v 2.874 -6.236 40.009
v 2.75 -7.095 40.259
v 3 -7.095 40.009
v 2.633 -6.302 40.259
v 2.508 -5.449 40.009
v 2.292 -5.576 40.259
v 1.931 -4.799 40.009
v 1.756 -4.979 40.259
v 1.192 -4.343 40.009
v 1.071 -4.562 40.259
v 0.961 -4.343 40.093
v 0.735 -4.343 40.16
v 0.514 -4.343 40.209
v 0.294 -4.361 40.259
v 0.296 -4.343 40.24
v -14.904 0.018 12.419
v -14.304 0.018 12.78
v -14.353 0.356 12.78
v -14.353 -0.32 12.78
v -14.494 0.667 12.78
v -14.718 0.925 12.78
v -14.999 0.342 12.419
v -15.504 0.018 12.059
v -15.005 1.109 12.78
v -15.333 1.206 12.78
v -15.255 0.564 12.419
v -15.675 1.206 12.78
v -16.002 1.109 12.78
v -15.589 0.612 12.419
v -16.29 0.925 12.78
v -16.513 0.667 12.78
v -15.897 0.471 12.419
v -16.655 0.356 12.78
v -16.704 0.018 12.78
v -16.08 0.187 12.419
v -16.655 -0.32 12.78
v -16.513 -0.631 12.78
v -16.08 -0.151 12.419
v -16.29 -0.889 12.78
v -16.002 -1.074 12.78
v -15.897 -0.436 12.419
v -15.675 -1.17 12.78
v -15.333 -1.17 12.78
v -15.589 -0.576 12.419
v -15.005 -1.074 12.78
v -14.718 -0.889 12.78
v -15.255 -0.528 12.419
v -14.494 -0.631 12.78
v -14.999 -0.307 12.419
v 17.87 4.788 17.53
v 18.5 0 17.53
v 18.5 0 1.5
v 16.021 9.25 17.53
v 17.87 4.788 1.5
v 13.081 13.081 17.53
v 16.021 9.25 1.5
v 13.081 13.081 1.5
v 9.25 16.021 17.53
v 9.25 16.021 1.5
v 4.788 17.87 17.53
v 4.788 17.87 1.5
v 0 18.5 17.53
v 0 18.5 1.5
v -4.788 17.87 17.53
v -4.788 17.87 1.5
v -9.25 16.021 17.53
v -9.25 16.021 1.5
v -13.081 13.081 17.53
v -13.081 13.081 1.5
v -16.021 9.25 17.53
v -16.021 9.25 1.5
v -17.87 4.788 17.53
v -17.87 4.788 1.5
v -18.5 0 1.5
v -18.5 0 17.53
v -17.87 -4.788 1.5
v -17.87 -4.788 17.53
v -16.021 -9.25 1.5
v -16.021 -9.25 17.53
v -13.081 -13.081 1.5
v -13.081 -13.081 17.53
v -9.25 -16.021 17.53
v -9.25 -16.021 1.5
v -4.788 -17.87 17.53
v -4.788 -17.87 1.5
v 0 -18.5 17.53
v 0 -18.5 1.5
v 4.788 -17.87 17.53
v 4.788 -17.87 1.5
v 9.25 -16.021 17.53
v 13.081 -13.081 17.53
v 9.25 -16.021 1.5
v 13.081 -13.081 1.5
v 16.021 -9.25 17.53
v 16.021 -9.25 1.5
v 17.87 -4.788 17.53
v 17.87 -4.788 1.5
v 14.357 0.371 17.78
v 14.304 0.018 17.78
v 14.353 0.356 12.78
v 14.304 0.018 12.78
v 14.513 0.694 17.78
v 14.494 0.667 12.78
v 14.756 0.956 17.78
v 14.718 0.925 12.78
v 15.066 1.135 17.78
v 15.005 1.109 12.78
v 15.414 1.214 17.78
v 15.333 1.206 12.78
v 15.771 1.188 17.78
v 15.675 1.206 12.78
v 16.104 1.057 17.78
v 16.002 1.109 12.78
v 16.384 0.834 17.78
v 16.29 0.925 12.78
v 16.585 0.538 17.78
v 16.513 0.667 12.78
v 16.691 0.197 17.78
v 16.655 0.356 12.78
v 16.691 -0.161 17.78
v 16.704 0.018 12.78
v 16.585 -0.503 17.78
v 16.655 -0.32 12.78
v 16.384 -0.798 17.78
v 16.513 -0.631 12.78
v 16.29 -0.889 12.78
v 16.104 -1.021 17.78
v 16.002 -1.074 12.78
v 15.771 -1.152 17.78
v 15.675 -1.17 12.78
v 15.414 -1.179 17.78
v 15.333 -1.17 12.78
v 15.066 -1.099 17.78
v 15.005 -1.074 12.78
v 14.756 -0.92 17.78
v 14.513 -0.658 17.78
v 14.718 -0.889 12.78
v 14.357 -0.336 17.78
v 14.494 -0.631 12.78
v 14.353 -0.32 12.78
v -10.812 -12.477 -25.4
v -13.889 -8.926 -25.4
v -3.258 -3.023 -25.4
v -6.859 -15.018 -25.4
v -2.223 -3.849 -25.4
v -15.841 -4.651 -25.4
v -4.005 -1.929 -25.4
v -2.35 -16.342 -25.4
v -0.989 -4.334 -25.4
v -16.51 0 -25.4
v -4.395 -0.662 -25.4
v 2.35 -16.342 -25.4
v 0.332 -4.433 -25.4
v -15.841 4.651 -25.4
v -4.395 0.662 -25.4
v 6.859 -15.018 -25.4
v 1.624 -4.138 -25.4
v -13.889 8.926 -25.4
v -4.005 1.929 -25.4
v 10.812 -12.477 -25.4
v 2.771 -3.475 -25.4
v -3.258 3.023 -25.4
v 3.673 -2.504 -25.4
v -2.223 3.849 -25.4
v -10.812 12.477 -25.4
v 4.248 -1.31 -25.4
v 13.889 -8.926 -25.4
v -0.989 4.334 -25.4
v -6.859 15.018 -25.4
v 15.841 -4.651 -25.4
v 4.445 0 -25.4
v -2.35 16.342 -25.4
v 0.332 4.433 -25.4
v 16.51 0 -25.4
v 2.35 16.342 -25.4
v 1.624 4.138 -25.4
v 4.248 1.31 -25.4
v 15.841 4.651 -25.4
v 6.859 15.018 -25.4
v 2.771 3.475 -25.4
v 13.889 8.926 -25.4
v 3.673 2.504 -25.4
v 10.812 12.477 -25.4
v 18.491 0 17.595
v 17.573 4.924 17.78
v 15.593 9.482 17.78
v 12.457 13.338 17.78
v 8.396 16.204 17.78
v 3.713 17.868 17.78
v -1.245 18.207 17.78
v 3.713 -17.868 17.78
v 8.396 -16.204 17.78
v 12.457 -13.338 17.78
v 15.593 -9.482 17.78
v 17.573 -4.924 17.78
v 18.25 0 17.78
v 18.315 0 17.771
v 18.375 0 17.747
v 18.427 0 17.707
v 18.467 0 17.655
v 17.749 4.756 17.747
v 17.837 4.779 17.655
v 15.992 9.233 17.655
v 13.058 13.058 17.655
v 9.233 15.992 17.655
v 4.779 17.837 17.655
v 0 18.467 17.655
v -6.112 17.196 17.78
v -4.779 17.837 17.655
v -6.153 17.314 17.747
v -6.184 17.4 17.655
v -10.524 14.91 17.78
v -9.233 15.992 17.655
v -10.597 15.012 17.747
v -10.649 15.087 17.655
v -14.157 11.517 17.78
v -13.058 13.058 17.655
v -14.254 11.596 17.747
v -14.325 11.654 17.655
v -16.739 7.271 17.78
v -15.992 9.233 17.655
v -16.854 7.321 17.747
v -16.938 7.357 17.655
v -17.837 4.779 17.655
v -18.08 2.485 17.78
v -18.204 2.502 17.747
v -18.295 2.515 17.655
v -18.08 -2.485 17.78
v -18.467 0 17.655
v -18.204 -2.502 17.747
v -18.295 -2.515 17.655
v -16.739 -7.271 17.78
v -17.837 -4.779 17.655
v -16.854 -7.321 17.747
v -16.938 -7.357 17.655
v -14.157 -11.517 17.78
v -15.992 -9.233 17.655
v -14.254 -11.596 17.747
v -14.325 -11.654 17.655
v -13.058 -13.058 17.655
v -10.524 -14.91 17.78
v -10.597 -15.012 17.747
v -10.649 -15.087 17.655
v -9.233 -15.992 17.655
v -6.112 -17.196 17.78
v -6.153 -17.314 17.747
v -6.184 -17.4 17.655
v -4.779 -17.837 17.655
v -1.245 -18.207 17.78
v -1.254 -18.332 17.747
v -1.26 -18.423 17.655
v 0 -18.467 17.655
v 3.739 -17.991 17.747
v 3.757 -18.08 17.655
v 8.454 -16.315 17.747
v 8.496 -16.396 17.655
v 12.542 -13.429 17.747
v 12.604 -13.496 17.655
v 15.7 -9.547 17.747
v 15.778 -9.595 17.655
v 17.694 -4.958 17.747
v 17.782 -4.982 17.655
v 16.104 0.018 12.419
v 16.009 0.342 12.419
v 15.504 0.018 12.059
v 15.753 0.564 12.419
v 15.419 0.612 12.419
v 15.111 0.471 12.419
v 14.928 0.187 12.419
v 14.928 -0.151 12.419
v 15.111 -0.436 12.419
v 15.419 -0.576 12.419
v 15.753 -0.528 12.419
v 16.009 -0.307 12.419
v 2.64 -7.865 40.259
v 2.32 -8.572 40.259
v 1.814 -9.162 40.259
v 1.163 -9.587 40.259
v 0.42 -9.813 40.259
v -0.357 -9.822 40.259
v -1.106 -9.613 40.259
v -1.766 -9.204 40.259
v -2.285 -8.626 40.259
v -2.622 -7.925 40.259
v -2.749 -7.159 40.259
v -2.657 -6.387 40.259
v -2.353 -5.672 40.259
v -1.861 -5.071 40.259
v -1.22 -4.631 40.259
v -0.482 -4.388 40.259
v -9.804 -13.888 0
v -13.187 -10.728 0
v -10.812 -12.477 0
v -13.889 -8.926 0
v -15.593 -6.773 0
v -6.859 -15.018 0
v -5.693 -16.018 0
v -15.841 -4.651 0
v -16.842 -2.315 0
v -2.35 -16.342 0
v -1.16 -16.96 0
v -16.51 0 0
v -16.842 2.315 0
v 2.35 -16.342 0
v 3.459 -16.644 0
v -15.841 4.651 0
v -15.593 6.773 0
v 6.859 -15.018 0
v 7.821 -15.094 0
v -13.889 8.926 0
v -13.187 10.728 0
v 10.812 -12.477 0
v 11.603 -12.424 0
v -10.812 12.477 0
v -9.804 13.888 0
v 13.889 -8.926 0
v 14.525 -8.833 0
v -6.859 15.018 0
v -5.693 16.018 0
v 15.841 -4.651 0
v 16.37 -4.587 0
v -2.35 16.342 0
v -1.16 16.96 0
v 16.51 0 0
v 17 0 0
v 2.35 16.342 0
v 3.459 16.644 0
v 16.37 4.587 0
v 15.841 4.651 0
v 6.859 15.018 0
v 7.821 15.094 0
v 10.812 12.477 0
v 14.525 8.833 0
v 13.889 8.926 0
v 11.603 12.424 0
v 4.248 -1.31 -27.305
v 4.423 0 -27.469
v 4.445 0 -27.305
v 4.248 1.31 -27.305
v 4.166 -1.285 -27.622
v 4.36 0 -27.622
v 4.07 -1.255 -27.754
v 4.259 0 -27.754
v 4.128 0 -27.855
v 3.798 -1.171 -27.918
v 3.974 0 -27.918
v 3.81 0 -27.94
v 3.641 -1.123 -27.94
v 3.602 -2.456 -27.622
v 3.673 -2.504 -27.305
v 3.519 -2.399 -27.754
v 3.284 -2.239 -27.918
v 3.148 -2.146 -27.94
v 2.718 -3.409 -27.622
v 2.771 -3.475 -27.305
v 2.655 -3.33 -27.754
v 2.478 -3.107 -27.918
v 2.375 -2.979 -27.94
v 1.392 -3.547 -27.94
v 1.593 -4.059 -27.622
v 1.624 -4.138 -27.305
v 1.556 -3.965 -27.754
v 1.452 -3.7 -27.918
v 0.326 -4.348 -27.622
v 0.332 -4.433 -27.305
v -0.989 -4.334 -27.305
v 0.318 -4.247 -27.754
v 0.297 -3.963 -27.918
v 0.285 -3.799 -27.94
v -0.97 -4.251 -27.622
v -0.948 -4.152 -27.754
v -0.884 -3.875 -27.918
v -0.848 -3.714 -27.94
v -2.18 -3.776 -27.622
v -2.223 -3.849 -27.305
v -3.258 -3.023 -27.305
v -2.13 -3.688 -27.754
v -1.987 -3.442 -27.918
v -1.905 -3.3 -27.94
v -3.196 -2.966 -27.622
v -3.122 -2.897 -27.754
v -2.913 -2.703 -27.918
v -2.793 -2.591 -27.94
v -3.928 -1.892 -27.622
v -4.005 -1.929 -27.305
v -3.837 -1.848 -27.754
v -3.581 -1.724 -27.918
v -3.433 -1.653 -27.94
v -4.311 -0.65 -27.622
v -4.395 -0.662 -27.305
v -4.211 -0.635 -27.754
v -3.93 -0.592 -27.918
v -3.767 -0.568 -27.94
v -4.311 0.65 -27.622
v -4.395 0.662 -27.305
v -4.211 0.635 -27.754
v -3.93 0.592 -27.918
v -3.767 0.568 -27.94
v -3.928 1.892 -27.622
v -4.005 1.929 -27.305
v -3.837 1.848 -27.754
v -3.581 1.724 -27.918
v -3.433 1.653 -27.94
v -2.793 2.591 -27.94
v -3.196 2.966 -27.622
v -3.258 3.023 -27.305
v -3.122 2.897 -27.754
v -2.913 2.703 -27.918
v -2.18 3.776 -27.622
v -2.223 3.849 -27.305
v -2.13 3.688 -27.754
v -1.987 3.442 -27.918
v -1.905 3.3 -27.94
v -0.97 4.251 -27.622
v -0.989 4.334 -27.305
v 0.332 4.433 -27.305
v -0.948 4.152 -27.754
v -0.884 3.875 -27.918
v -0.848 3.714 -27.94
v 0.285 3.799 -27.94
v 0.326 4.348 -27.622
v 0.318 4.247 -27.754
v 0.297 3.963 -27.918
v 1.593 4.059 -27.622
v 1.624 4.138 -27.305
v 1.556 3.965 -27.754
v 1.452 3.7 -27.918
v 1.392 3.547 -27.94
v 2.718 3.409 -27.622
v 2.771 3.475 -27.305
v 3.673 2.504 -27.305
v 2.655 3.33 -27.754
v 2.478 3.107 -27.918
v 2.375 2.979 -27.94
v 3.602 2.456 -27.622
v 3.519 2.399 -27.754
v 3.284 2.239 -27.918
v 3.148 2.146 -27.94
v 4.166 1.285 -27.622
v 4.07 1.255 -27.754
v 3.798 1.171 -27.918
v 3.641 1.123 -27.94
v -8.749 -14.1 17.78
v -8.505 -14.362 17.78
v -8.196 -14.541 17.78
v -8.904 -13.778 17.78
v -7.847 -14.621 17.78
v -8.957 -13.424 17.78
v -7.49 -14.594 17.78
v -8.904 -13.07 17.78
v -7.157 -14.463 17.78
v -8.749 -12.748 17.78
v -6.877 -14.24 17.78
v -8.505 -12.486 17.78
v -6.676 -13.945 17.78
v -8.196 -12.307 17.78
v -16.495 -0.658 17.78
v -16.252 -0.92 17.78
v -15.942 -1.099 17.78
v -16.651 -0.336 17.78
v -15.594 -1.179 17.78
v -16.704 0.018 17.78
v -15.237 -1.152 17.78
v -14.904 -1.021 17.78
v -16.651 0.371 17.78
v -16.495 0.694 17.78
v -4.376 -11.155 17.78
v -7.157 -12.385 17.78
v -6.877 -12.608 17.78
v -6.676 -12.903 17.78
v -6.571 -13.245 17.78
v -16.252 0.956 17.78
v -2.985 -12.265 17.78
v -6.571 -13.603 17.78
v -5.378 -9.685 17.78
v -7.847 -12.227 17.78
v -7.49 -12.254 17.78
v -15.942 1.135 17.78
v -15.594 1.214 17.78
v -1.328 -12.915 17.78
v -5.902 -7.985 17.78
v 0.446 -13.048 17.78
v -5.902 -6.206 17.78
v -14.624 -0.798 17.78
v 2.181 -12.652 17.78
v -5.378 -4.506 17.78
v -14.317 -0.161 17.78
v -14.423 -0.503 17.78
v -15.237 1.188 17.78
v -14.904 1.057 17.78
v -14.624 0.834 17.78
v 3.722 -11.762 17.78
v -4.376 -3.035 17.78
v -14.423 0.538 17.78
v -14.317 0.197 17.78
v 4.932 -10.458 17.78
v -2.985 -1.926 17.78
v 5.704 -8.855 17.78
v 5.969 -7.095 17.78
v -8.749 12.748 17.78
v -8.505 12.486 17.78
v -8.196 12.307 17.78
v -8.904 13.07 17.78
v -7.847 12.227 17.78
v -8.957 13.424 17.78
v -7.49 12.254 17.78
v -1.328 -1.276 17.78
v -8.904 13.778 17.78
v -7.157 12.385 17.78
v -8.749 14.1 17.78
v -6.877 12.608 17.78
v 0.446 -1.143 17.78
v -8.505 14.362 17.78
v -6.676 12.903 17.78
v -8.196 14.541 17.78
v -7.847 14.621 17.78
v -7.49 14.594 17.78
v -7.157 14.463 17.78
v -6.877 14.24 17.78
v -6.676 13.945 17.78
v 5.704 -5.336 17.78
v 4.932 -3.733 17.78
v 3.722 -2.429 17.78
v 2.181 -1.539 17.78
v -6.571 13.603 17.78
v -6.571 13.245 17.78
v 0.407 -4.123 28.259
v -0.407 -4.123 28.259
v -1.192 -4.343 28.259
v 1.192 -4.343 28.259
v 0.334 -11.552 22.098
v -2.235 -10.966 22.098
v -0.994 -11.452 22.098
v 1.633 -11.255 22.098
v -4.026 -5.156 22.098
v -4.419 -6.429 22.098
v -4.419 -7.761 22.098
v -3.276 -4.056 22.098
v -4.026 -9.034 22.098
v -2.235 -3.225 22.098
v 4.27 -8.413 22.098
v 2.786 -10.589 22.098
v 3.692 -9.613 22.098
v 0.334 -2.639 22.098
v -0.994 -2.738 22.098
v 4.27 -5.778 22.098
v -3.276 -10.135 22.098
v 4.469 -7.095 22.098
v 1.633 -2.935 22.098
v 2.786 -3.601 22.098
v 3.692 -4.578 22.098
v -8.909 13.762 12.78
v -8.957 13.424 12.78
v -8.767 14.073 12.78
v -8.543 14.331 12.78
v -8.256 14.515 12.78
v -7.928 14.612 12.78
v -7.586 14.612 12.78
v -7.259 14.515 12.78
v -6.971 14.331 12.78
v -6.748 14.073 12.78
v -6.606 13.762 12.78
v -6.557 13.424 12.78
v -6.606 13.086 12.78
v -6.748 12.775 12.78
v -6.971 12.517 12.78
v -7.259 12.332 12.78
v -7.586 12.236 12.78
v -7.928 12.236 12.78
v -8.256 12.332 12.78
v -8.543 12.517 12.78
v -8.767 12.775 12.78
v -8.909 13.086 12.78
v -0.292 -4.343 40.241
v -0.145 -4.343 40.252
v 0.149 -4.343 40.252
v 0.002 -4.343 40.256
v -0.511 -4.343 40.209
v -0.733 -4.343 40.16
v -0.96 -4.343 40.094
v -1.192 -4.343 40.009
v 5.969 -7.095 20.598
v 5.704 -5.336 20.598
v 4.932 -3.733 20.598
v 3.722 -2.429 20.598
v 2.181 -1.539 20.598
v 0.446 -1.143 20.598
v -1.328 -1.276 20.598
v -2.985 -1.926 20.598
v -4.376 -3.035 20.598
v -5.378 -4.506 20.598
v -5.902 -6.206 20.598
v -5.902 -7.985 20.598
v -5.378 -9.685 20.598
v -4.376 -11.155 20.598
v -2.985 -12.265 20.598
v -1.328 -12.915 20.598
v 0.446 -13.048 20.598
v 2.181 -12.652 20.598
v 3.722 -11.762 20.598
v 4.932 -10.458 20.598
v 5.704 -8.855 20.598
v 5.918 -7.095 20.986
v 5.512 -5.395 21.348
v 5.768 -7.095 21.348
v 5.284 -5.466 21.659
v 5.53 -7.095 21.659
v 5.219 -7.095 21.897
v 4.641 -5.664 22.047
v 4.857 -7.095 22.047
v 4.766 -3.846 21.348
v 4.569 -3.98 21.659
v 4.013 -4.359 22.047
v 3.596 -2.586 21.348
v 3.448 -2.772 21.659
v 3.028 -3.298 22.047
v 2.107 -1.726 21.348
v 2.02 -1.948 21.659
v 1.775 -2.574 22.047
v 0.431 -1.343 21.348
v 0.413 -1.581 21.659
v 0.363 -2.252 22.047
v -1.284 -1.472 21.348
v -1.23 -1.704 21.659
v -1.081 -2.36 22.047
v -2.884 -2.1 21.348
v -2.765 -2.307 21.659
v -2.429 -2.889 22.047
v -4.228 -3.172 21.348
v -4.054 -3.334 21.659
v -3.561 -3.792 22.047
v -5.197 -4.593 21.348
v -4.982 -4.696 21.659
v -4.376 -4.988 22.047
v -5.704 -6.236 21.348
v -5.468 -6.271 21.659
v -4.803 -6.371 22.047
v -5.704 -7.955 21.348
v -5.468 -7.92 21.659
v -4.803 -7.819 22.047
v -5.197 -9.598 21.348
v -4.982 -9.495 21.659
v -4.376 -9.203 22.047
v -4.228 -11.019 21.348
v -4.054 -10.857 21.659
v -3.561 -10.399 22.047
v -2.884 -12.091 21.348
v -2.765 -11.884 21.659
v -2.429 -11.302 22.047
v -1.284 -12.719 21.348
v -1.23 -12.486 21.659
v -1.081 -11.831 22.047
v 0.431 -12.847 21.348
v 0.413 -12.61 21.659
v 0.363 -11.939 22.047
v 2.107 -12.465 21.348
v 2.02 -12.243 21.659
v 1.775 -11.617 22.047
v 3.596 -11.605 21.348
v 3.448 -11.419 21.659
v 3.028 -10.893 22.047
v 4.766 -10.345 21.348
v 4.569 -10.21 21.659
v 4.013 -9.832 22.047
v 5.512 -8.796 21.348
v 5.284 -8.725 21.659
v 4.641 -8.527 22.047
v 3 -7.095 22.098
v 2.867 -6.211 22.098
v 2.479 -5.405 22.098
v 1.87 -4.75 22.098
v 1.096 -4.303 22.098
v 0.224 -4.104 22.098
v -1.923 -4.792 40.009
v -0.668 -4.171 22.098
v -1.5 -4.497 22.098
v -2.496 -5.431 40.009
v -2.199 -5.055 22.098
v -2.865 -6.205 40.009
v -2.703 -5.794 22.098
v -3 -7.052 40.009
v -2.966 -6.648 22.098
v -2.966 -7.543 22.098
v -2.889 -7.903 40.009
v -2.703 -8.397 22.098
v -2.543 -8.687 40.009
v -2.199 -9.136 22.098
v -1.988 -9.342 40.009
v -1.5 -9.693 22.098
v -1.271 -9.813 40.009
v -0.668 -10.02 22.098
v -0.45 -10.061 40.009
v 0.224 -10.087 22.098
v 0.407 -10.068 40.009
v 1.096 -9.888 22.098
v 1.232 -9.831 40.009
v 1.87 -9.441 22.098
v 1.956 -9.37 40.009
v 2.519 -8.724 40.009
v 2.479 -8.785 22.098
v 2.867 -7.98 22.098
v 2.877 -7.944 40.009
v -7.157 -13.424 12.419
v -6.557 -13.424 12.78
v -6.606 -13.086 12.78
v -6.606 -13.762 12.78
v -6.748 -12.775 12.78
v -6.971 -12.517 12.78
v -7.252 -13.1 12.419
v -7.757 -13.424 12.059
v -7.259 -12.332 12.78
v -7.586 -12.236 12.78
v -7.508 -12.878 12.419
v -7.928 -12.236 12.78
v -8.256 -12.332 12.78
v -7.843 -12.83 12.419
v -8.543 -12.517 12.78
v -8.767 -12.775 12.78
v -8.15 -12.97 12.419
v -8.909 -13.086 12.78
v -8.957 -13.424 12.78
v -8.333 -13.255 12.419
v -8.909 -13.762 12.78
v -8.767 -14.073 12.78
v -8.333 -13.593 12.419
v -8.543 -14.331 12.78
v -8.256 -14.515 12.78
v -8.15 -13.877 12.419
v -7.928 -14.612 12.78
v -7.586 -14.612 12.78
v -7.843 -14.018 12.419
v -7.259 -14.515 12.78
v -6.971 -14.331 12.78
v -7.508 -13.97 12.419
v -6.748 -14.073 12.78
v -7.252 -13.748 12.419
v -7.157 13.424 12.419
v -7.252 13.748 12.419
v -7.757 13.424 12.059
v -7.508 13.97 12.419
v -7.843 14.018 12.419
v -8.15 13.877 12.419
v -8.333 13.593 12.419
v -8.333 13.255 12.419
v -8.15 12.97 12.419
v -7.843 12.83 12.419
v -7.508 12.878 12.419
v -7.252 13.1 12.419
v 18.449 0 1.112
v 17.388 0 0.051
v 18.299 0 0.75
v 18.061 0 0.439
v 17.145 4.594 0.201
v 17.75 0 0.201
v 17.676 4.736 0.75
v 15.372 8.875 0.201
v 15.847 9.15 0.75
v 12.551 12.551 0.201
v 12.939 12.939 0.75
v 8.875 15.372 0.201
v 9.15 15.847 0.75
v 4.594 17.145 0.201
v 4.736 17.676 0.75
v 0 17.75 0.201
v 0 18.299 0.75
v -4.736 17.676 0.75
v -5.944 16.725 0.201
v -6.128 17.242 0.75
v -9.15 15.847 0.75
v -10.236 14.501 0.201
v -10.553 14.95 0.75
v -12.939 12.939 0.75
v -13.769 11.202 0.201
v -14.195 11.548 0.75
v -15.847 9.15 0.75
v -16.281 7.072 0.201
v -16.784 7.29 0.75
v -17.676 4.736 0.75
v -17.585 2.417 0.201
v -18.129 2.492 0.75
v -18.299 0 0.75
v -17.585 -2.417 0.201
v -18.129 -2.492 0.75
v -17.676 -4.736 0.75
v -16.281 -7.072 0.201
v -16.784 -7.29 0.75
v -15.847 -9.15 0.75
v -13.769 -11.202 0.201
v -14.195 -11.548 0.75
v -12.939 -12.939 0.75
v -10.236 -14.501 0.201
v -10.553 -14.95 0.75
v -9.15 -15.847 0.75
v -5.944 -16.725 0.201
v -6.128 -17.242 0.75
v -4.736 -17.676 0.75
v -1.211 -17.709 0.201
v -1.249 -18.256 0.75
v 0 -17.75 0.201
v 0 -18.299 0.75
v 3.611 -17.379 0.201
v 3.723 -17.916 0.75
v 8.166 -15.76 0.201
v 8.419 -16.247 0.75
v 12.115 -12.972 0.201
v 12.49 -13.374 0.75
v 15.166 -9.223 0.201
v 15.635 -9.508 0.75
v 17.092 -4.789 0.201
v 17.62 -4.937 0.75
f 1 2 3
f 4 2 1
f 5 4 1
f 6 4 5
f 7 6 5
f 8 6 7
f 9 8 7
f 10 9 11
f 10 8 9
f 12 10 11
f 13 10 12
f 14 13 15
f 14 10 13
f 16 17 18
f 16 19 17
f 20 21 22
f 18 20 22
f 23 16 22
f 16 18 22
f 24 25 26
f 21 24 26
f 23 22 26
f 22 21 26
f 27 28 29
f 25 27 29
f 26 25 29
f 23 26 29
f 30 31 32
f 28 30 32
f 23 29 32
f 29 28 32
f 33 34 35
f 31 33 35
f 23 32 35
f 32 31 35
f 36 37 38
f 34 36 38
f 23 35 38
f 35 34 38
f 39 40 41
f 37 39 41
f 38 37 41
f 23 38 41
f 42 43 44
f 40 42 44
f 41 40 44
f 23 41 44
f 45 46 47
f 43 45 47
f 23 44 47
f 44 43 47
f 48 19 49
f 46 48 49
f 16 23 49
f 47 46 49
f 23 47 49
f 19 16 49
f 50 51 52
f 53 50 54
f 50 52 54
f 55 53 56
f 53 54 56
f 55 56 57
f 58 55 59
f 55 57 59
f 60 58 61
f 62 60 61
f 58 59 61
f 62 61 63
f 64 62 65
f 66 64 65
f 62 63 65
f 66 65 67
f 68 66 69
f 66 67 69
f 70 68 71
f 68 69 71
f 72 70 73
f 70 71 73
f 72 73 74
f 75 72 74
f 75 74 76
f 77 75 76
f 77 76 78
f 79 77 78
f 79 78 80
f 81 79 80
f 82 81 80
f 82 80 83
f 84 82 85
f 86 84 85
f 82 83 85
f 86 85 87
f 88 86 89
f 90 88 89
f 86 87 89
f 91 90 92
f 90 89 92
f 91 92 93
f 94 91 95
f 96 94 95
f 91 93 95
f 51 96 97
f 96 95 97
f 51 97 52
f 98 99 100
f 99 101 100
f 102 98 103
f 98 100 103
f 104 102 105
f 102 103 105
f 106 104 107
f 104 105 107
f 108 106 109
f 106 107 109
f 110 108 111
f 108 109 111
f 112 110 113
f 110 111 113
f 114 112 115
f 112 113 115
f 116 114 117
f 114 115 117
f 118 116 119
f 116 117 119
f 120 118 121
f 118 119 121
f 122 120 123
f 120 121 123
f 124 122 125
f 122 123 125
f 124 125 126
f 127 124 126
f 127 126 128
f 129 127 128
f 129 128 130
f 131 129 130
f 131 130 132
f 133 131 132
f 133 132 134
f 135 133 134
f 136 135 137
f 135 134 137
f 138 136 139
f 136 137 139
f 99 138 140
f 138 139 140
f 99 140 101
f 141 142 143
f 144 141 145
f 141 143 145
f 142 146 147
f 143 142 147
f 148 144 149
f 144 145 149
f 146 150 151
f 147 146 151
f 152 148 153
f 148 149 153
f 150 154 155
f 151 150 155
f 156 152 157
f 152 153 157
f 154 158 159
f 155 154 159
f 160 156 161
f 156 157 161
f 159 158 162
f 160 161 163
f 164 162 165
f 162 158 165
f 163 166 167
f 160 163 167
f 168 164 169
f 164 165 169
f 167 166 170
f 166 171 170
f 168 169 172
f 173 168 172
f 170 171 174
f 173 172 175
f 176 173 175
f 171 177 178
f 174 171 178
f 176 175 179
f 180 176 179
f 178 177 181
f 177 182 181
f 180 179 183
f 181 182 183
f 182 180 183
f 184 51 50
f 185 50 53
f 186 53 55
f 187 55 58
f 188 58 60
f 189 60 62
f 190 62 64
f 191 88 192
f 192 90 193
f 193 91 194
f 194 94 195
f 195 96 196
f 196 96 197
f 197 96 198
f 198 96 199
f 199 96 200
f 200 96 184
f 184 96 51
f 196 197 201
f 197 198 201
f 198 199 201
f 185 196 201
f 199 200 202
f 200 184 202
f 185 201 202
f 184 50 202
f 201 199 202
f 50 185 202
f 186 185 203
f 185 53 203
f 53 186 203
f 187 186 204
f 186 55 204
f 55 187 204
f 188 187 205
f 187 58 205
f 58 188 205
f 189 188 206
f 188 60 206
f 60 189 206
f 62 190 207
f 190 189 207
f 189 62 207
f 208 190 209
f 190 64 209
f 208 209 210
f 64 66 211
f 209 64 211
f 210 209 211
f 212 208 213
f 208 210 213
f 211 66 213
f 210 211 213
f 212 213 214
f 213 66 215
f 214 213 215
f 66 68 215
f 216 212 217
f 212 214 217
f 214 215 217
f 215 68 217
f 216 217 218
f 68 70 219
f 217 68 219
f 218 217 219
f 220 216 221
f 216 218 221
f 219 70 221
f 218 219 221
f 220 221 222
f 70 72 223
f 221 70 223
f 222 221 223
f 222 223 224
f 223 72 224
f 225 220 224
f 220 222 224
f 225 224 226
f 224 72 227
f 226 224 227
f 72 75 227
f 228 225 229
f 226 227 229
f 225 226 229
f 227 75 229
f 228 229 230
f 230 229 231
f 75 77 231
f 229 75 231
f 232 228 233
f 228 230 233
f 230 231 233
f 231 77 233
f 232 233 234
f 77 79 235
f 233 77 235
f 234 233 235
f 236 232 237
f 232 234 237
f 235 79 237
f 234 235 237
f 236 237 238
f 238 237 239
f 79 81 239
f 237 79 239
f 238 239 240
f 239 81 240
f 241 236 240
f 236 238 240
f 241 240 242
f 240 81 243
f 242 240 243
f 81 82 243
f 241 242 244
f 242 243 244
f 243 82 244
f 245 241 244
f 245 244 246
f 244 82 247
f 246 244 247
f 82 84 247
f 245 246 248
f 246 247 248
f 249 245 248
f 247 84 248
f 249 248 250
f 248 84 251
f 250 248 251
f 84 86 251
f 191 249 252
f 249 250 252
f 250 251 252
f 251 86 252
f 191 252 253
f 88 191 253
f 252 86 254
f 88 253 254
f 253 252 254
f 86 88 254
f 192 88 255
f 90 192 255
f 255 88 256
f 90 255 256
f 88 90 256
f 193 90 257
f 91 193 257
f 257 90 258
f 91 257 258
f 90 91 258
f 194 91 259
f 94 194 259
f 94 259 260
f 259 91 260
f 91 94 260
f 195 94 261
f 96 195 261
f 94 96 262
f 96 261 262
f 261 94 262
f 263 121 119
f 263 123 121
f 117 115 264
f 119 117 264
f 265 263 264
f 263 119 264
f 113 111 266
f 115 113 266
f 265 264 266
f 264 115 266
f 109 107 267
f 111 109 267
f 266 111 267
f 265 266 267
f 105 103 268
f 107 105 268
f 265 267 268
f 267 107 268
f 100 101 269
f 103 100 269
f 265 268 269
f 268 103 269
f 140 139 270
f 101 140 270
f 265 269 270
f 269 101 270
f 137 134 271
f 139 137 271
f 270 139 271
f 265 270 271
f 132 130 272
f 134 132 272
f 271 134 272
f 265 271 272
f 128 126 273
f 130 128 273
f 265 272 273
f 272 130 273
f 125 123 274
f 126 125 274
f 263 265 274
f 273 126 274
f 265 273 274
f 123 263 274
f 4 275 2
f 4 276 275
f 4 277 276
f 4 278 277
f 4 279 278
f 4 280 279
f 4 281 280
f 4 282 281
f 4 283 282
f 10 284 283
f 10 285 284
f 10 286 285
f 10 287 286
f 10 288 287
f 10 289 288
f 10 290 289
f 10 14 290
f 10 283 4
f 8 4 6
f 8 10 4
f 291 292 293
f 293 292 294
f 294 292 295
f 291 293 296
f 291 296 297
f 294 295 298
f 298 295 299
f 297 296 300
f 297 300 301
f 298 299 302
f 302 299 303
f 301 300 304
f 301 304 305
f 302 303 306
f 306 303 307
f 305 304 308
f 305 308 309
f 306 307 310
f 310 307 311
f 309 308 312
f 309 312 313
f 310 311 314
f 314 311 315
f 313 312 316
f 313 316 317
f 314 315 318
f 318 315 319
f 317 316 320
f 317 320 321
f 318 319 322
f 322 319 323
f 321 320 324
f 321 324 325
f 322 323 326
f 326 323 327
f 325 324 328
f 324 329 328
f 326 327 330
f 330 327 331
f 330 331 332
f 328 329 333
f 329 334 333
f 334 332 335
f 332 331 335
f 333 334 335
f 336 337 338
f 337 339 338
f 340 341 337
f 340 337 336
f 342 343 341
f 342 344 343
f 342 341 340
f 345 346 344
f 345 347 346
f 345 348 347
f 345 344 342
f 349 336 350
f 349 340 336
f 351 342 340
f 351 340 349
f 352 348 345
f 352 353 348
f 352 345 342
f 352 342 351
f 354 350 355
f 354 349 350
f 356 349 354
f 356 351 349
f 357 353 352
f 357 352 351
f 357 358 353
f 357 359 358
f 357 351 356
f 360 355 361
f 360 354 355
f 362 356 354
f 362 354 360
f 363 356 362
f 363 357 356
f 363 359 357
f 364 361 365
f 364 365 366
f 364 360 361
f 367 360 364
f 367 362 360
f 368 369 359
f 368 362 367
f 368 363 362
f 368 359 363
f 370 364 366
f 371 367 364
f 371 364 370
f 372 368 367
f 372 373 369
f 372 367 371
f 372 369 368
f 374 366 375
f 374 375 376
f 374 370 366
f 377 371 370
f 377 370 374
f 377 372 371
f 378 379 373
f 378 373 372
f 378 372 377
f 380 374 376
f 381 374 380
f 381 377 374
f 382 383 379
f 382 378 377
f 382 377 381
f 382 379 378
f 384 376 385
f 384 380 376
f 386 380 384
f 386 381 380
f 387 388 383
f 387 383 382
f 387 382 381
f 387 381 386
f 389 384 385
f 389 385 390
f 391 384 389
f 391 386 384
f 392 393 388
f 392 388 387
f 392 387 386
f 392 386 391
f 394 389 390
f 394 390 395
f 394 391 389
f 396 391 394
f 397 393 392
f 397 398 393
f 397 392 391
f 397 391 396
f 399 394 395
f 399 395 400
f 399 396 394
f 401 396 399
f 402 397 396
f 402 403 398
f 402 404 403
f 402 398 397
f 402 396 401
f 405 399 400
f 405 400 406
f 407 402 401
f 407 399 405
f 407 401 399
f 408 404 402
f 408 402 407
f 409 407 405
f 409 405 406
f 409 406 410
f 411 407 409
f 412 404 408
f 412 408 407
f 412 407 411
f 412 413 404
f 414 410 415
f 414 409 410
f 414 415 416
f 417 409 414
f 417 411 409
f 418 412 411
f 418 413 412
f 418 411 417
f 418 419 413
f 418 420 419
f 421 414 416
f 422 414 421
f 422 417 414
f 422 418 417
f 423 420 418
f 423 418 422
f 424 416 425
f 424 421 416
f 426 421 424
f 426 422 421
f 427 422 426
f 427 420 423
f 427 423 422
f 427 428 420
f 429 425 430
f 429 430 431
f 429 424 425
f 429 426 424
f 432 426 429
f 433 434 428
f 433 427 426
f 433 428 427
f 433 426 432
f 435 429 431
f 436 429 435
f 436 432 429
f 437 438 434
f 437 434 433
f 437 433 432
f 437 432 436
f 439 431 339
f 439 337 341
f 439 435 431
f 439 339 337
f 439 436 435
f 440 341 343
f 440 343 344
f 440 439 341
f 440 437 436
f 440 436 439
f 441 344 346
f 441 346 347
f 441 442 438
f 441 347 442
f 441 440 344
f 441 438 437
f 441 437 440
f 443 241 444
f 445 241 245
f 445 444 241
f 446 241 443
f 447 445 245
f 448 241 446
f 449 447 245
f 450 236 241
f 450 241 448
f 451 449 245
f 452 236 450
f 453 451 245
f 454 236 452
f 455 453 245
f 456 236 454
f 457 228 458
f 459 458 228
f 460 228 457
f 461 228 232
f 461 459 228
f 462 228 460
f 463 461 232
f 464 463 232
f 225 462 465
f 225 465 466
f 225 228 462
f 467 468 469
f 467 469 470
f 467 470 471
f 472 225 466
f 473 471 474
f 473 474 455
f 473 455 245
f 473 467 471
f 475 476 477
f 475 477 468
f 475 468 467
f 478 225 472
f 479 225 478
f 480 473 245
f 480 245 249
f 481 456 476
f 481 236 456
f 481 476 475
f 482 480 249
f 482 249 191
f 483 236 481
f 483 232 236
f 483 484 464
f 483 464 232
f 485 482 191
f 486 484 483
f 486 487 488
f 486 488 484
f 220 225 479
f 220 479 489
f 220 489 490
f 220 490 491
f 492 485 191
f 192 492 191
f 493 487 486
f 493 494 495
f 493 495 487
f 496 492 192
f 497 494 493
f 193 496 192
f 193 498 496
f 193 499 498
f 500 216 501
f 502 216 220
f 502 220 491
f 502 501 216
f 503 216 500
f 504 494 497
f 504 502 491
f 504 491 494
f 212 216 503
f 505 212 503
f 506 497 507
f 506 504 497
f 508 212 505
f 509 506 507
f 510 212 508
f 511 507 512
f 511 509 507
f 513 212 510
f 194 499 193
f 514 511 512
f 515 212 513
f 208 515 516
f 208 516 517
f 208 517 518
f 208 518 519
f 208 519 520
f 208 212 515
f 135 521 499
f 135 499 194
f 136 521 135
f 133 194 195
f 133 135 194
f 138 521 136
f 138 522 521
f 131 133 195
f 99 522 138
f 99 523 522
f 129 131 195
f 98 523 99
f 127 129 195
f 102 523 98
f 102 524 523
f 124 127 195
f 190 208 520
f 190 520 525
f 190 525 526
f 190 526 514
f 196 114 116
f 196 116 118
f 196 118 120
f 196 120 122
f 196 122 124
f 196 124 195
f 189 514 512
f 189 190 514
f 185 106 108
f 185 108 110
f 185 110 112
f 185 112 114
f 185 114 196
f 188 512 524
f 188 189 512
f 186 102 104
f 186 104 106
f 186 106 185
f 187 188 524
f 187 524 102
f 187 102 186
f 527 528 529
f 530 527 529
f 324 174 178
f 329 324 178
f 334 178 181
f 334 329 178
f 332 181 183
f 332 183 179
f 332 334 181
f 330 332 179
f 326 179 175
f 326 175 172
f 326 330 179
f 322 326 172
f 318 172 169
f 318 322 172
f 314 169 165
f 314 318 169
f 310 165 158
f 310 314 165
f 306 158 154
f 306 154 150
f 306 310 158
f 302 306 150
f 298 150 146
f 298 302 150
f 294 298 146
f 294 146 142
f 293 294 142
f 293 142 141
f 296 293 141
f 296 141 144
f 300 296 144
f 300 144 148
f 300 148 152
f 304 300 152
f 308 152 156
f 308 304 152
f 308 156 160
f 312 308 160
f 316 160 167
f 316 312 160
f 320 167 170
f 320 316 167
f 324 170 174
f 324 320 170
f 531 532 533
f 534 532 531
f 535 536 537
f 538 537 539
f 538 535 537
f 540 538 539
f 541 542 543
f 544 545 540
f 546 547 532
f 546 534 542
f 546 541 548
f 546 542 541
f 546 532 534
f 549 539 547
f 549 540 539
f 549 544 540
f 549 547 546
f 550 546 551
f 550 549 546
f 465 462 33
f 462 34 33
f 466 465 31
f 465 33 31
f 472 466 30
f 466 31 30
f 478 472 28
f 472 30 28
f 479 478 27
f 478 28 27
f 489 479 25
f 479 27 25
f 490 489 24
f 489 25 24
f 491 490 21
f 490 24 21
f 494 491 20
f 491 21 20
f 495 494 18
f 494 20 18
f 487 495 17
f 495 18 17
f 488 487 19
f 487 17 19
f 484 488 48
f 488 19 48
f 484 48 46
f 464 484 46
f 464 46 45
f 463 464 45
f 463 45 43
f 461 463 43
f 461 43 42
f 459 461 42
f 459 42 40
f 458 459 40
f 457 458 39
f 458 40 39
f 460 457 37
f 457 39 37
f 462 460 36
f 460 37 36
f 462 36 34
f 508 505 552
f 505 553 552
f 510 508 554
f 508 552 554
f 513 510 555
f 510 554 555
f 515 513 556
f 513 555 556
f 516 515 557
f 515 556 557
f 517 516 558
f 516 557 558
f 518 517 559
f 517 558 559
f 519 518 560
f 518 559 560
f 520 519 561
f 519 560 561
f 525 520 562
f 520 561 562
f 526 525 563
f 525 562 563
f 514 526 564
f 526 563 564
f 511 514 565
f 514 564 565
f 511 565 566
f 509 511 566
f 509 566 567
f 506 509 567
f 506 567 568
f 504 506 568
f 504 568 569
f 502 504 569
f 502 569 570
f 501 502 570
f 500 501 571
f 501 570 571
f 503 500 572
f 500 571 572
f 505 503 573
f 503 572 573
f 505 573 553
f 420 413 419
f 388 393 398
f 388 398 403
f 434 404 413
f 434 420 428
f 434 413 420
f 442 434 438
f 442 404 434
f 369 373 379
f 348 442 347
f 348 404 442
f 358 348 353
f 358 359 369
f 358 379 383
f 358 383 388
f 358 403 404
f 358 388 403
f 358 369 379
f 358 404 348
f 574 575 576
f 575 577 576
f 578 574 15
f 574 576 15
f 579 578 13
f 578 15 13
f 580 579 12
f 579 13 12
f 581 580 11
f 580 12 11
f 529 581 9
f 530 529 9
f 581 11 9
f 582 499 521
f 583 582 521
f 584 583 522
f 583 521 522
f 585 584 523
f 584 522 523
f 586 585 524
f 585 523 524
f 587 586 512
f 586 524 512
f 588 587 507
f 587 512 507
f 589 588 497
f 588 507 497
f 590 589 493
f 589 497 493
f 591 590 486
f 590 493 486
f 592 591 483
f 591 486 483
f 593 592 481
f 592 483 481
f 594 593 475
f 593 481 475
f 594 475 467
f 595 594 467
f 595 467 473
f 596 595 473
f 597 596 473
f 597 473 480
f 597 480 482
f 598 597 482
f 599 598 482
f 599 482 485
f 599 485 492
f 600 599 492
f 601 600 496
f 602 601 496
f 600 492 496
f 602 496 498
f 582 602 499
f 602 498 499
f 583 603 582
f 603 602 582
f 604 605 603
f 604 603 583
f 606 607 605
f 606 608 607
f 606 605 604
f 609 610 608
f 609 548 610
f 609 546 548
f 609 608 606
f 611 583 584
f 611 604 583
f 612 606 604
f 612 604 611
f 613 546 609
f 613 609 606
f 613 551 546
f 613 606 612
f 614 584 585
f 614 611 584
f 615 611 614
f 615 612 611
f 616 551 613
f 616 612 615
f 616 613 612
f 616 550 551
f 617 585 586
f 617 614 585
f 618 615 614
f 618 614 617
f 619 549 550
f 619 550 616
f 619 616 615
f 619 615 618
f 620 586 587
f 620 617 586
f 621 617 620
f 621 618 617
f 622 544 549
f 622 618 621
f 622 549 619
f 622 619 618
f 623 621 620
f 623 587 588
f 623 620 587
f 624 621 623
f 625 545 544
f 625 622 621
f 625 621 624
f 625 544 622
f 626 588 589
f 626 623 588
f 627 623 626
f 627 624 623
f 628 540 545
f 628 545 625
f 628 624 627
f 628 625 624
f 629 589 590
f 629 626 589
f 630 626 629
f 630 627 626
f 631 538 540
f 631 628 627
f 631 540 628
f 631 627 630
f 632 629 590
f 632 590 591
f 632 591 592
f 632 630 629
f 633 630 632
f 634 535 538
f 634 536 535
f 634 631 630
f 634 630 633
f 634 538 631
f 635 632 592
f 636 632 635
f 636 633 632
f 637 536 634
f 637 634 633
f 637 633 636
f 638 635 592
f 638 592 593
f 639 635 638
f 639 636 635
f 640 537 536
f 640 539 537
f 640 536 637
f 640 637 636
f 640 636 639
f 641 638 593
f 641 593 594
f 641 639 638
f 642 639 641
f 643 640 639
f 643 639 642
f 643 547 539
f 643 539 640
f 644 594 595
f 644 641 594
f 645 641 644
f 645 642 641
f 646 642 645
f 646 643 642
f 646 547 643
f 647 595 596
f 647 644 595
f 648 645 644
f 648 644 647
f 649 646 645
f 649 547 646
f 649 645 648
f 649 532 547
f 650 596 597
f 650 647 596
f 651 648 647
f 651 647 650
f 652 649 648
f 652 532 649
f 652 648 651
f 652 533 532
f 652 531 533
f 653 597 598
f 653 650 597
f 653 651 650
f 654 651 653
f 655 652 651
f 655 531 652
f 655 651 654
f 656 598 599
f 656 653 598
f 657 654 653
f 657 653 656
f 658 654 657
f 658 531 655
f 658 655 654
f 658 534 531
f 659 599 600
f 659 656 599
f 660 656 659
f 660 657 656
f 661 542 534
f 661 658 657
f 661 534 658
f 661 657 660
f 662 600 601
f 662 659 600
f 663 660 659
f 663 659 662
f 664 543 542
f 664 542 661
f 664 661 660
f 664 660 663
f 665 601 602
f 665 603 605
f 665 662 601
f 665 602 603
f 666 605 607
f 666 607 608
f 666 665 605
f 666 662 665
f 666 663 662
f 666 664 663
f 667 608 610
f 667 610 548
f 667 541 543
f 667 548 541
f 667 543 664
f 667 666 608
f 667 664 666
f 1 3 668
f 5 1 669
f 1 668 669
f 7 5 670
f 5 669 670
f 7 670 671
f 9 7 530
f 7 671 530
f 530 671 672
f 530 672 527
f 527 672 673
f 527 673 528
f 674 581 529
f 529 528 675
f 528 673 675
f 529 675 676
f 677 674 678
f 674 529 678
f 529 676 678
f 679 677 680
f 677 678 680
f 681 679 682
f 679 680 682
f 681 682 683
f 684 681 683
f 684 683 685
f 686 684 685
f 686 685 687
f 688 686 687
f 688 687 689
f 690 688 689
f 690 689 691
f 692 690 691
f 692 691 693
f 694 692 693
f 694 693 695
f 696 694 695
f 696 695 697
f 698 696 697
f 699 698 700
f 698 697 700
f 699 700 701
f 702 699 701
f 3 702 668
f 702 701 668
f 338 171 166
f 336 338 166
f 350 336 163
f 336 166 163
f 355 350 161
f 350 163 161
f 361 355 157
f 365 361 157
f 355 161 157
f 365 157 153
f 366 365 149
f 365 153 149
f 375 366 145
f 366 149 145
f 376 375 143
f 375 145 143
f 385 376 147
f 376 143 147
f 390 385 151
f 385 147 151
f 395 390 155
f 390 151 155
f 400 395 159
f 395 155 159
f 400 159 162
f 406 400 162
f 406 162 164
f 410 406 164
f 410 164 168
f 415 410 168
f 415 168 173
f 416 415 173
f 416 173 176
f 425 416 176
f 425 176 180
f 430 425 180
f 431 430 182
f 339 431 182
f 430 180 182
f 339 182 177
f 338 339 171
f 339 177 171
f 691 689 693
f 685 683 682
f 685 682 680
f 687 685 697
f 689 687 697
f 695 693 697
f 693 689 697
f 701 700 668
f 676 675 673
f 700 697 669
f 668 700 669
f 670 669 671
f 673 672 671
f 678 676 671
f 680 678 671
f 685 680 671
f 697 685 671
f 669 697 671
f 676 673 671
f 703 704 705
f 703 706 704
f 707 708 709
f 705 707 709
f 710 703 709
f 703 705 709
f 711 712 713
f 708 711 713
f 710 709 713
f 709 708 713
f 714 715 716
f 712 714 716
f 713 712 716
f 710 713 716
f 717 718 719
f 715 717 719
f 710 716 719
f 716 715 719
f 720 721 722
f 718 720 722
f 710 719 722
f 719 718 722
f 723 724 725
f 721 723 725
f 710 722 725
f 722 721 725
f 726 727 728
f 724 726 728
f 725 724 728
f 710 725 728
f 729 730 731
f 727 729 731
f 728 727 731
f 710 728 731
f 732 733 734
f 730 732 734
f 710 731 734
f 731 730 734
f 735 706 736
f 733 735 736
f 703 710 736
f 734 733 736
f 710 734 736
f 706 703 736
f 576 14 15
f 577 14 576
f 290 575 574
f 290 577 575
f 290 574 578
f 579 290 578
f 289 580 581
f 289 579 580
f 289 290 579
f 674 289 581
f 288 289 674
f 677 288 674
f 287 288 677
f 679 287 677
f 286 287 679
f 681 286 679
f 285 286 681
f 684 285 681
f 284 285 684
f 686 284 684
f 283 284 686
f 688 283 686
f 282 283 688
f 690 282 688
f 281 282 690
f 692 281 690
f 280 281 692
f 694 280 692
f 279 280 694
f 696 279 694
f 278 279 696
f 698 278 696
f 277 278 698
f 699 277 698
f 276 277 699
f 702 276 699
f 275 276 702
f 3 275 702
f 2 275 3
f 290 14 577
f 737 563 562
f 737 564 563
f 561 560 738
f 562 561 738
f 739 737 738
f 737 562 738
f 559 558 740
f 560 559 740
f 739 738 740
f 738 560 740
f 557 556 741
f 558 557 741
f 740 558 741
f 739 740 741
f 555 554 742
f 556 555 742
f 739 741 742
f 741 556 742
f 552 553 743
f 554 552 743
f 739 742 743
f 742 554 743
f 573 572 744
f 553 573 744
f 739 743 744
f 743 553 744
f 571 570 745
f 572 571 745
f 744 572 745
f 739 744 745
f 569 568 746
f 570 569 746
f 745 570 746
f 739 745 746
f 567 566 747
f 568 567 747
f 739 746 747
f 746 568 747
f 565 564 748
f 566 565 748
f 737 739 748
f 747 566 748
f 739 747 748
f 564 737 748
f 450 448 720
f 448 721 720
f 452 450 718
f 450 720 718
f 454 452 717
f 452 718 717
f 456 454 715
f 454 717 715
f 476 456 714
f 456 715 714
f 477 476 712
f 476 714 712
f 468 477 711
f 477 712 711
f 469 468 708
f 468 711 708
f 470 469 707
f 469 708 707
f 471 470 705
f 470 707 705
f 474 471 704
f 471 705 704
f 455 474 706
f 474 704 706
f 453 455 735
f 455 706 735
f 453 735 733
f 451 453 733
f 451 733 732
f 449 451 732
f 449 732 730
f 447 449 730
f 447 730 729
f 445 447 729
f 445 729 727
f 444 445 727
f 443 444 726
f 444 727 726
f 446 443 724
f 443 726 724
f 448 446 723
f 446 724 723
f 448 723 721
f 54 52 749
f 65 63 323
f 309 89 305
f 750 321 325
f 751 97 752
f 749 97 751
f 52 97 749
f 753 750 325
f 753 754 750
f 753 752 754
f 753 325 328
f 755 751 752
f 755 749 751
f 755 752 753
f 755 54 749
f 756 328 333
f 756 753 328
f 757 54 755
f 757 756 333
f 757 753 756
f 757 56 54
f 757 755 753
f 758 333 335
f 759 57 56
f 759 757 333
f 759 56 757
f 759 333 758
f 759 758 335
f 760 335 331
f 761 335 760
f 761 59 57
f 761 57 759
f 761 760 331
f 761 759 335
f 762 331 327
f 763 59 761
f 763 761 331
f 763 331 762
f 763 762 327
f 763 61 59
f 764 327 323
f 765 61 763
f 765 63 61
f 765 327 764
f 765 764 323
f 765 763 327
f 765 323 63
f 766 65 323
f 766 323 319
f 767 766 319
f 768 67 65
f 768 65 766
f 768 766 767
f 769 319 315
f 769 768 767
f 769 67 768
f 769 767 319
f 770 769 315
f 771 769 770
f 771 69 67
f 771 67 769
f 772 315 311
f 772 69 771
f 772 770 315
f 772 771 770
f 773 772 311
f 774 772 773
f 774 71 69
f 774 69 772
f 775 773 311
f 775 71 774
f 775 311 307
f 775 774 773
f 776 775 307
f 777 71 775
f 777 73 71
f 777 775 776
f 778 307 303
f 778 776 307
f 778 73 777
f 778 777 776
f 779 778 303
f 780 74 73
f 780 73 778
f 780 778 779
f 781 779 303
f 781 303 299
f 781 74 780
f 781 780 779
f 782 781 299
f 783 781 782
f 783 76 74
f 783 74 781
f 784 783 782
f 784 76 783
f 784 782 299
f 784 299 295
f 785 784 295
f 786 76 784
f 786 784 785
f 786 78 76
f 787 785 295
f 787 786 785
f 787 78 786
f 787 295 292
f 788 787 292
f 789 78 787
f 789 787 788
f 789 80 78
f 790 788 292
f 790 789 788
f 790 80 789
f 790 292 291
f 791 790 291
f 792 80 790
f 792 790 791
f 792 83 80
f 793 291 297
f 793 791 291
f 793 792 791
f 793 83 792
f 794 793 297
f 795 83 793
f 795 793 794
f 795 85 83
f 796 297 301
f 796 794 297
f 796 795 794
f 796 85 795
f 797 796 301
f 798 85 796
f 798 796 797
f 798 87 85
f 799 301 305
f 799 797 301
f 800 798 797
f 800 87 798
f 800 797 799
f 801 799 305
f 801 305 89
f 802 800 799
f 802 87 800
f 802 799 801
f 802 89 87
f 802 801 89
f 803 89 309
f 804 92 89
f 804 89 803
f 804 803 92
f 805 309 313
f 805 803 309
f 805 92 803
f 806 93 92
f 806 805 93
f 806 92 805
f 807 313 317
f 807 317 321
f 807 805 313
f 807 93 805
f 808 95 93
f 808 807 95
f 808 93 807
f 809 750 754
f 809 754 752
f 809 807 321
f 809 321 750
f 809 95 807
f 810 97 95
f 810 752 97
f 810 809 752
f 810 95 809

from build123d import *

# Parameters (mm, degrees)
F0_R         = 18.5
F0_R_2       = 16.51
F1_DEPTH     = 17.78
F2_R         = 5.969
F3_DEPTH     = 4.318
F4_R         = 3
F5_DEPTH     = 18.161
F7_DEPTH     = 12
F8_DEPTH     = 25.4
F9_R         = 4.445
F10_DEPTH    = 2.54
F11_R        = 0.635
F12_R        = 1.5
F13_R        = 1.5
F14_R        = 0.25
F15_T2_ANGLE = 276.1399558047
F15_T4_ANGLE = 96.0574088809
F16_D        = 2.4
F16_DEPTH    = 5
F16_TIP      = 0.7210327428


# Not quite as in the source:
# - a fillet or chamfer that OpenCascade refuses, or shapes differently, is made with other operations: its cross-section is extruded or revolved along the edge and cut away or added


with BuildPart() as f1:
    # F0 (on Top) → F1 (new body)
    with BuildSketch(Plane.XY):
        Circle(F0_R)
        Circle(F0_R_2, mode=Mode.SUBTRACT)
        Circle(F0_R_2)
    extrude(amount=F1_DEPTH)

    # F2 (on face) → F3 (join)
    with BuildSketch(Plane.XY.offset(17.78)):
        with Locations((0, -7.0954)):
            Circle(F2_R)
    extrude(amount=F3_DEPTH)

    # F0 (on Top) → F8 (join)
    with BuildSketch(Plane.XY):
        Circle(F0_R_2)
    extrude(amount=-F8_DEPTH)

    # F9 (on face) → F10 (join)
    with BuildSketch(Plane(origin=(0, 0, -25.4), x_dir=(1, 0, 0), z_dir=(0, 0, -1))):
        Circle(F9_R)
    extrude(amount=F10_DEPTH)

    # F11
    f11_edges = [f1.edges().sort_by_distance(p)[0] for p in [
        (-4.445, 0, -27.94),
    ]]
    fillet(f11_edges, radius=F11_R)

    # F12
    f12_edges = [f1.edges().sort_by_distance(p)[0] for p in [
        (-18.5, 0, 0),
    ]]
    fillet(f12_edges, radius=F12_R)

    # F13
    f13_edges = [f1.edges().sort_by_distance(p)[0] for p in [
        (-5.969, -7.0954, 22.098),
    ]]
    fillet(f13_edges, radius=F13_R)

    # F14
    f14_edges = [f1.edges().sort_by_distance(p)[0] for p in [
        (-18.5, 0, 17.78),
    ]]
    fillet(f14_edges, radius=F14_R)

    # F16
    with Locations(Plane.XY.offset(17.78)):
        with Locations((-7.7571209086, 13.4239), (-7.7571209086, -13.4239), (15.5039898493, 0.0177412977), (-15.5039898493, 0.0177412977)):
            Hole(F16_D / 2, depth=F16_DEPTH)
            with Locations((0, 0, -(F16_DEPTH + F16_TIP / 2))):  # 118° drill point
                Cone(0, F16_D / 2, F16_TIP, mode=Mode.SUBTRACT)


with BuildPart() as f5:
    # F4 (on face) → F5 (new body)
    with BuildSketch(Plane.XY.offset(22.098)):
        with Locations((0, -7.0954)):
            Circle(F4_R)
    extrude(amount=F5_DEPTH)

    # F6 (on face) → F7 (cut)
    with BuildSketch(Plane.XY.offset(40.259)):
        with BuildLine():
            ThreePointArc((1.1923271, -4.3425185847), (0, -4.0954), (-1.1923271, -4.3425185847))
            Line((-1.1923271, -4.3425185847), (1.1923271, -4.3425185847))
        make_face()
    extrude(amount=-F7_DEPTH, mode=Mode.SUBTRACT)

    # F15: chamfer of 0.25 on 2 edges, made by hand

    # F15_s1 → F15_t2 (revolve, cut)
    with BuildSketch(Plane(origin=(0.7545525529, -0.0811706499, 0), x_dir=(0, 0, 1), z_dir=(0.994263598, -0.1069574573, 0))):
        with BuildLine():
            Line((40.0019289322, 4.0476268655), (40.2660710678, 4.3117690011))
            Line((40.2660710678, 4.3117690011), (40.2710710678, 4.3117690011))
            ThreePointArc((40.2710710678, 4.3117690011), (40.264, 4.1832334672), (40.264, 4.0546979333))
            Line((40.264, 4.0546979333), (40.259, 4.0496979333))
            ThreePointArc((40.259, 4.0496979333), (40.1304644661, 4.0496979333), (40.0019289322, 4.0426268655))
            Line((40.0019289322, 4.0426268655), (40.0019289322, 4.0476268655))
        make_face()
    revolve(axis=Axis((0, -7.0954, 40.259), (0, 0, 1)), revolution_arc=F15_T2_ANGLE, mode=Mode.SUBTRACT)

    # F15_s3 → F15_t4 (revolve, cut)
    with BuildSketch(Plane.XZ.offset(7.0954)):
        with BuildLine():
            Line((3.0070710678, 40.0019289322), (2.7429289322, 40.2660710678))
            Line((2.7429289322, 40.2660710678), (2.7429289322, 40.2710710678))
            ThreePointArc((2.7429289322, 40.2710710678), (2.8714644661, 40.264), (3, 40.264))
            Line((3, 40.264), (3.005, 40.259))
            ThreePointArc((3.005, 40.259), (3.005, 40.1304644661), (3.0120710678, 40.0019289322))
            Line((3.0120710678, 40.0019289322), (3.0070710678, 40.0019289322))
        make_face()
    revolve(axis=Axis((0, -7.0954, 40.259), (0, 0, 1)), revolution_arc=F15_T4_ANGLE, mode=Mode.SUBTRACT)


solid = Compound([f1.part, f5.part])
